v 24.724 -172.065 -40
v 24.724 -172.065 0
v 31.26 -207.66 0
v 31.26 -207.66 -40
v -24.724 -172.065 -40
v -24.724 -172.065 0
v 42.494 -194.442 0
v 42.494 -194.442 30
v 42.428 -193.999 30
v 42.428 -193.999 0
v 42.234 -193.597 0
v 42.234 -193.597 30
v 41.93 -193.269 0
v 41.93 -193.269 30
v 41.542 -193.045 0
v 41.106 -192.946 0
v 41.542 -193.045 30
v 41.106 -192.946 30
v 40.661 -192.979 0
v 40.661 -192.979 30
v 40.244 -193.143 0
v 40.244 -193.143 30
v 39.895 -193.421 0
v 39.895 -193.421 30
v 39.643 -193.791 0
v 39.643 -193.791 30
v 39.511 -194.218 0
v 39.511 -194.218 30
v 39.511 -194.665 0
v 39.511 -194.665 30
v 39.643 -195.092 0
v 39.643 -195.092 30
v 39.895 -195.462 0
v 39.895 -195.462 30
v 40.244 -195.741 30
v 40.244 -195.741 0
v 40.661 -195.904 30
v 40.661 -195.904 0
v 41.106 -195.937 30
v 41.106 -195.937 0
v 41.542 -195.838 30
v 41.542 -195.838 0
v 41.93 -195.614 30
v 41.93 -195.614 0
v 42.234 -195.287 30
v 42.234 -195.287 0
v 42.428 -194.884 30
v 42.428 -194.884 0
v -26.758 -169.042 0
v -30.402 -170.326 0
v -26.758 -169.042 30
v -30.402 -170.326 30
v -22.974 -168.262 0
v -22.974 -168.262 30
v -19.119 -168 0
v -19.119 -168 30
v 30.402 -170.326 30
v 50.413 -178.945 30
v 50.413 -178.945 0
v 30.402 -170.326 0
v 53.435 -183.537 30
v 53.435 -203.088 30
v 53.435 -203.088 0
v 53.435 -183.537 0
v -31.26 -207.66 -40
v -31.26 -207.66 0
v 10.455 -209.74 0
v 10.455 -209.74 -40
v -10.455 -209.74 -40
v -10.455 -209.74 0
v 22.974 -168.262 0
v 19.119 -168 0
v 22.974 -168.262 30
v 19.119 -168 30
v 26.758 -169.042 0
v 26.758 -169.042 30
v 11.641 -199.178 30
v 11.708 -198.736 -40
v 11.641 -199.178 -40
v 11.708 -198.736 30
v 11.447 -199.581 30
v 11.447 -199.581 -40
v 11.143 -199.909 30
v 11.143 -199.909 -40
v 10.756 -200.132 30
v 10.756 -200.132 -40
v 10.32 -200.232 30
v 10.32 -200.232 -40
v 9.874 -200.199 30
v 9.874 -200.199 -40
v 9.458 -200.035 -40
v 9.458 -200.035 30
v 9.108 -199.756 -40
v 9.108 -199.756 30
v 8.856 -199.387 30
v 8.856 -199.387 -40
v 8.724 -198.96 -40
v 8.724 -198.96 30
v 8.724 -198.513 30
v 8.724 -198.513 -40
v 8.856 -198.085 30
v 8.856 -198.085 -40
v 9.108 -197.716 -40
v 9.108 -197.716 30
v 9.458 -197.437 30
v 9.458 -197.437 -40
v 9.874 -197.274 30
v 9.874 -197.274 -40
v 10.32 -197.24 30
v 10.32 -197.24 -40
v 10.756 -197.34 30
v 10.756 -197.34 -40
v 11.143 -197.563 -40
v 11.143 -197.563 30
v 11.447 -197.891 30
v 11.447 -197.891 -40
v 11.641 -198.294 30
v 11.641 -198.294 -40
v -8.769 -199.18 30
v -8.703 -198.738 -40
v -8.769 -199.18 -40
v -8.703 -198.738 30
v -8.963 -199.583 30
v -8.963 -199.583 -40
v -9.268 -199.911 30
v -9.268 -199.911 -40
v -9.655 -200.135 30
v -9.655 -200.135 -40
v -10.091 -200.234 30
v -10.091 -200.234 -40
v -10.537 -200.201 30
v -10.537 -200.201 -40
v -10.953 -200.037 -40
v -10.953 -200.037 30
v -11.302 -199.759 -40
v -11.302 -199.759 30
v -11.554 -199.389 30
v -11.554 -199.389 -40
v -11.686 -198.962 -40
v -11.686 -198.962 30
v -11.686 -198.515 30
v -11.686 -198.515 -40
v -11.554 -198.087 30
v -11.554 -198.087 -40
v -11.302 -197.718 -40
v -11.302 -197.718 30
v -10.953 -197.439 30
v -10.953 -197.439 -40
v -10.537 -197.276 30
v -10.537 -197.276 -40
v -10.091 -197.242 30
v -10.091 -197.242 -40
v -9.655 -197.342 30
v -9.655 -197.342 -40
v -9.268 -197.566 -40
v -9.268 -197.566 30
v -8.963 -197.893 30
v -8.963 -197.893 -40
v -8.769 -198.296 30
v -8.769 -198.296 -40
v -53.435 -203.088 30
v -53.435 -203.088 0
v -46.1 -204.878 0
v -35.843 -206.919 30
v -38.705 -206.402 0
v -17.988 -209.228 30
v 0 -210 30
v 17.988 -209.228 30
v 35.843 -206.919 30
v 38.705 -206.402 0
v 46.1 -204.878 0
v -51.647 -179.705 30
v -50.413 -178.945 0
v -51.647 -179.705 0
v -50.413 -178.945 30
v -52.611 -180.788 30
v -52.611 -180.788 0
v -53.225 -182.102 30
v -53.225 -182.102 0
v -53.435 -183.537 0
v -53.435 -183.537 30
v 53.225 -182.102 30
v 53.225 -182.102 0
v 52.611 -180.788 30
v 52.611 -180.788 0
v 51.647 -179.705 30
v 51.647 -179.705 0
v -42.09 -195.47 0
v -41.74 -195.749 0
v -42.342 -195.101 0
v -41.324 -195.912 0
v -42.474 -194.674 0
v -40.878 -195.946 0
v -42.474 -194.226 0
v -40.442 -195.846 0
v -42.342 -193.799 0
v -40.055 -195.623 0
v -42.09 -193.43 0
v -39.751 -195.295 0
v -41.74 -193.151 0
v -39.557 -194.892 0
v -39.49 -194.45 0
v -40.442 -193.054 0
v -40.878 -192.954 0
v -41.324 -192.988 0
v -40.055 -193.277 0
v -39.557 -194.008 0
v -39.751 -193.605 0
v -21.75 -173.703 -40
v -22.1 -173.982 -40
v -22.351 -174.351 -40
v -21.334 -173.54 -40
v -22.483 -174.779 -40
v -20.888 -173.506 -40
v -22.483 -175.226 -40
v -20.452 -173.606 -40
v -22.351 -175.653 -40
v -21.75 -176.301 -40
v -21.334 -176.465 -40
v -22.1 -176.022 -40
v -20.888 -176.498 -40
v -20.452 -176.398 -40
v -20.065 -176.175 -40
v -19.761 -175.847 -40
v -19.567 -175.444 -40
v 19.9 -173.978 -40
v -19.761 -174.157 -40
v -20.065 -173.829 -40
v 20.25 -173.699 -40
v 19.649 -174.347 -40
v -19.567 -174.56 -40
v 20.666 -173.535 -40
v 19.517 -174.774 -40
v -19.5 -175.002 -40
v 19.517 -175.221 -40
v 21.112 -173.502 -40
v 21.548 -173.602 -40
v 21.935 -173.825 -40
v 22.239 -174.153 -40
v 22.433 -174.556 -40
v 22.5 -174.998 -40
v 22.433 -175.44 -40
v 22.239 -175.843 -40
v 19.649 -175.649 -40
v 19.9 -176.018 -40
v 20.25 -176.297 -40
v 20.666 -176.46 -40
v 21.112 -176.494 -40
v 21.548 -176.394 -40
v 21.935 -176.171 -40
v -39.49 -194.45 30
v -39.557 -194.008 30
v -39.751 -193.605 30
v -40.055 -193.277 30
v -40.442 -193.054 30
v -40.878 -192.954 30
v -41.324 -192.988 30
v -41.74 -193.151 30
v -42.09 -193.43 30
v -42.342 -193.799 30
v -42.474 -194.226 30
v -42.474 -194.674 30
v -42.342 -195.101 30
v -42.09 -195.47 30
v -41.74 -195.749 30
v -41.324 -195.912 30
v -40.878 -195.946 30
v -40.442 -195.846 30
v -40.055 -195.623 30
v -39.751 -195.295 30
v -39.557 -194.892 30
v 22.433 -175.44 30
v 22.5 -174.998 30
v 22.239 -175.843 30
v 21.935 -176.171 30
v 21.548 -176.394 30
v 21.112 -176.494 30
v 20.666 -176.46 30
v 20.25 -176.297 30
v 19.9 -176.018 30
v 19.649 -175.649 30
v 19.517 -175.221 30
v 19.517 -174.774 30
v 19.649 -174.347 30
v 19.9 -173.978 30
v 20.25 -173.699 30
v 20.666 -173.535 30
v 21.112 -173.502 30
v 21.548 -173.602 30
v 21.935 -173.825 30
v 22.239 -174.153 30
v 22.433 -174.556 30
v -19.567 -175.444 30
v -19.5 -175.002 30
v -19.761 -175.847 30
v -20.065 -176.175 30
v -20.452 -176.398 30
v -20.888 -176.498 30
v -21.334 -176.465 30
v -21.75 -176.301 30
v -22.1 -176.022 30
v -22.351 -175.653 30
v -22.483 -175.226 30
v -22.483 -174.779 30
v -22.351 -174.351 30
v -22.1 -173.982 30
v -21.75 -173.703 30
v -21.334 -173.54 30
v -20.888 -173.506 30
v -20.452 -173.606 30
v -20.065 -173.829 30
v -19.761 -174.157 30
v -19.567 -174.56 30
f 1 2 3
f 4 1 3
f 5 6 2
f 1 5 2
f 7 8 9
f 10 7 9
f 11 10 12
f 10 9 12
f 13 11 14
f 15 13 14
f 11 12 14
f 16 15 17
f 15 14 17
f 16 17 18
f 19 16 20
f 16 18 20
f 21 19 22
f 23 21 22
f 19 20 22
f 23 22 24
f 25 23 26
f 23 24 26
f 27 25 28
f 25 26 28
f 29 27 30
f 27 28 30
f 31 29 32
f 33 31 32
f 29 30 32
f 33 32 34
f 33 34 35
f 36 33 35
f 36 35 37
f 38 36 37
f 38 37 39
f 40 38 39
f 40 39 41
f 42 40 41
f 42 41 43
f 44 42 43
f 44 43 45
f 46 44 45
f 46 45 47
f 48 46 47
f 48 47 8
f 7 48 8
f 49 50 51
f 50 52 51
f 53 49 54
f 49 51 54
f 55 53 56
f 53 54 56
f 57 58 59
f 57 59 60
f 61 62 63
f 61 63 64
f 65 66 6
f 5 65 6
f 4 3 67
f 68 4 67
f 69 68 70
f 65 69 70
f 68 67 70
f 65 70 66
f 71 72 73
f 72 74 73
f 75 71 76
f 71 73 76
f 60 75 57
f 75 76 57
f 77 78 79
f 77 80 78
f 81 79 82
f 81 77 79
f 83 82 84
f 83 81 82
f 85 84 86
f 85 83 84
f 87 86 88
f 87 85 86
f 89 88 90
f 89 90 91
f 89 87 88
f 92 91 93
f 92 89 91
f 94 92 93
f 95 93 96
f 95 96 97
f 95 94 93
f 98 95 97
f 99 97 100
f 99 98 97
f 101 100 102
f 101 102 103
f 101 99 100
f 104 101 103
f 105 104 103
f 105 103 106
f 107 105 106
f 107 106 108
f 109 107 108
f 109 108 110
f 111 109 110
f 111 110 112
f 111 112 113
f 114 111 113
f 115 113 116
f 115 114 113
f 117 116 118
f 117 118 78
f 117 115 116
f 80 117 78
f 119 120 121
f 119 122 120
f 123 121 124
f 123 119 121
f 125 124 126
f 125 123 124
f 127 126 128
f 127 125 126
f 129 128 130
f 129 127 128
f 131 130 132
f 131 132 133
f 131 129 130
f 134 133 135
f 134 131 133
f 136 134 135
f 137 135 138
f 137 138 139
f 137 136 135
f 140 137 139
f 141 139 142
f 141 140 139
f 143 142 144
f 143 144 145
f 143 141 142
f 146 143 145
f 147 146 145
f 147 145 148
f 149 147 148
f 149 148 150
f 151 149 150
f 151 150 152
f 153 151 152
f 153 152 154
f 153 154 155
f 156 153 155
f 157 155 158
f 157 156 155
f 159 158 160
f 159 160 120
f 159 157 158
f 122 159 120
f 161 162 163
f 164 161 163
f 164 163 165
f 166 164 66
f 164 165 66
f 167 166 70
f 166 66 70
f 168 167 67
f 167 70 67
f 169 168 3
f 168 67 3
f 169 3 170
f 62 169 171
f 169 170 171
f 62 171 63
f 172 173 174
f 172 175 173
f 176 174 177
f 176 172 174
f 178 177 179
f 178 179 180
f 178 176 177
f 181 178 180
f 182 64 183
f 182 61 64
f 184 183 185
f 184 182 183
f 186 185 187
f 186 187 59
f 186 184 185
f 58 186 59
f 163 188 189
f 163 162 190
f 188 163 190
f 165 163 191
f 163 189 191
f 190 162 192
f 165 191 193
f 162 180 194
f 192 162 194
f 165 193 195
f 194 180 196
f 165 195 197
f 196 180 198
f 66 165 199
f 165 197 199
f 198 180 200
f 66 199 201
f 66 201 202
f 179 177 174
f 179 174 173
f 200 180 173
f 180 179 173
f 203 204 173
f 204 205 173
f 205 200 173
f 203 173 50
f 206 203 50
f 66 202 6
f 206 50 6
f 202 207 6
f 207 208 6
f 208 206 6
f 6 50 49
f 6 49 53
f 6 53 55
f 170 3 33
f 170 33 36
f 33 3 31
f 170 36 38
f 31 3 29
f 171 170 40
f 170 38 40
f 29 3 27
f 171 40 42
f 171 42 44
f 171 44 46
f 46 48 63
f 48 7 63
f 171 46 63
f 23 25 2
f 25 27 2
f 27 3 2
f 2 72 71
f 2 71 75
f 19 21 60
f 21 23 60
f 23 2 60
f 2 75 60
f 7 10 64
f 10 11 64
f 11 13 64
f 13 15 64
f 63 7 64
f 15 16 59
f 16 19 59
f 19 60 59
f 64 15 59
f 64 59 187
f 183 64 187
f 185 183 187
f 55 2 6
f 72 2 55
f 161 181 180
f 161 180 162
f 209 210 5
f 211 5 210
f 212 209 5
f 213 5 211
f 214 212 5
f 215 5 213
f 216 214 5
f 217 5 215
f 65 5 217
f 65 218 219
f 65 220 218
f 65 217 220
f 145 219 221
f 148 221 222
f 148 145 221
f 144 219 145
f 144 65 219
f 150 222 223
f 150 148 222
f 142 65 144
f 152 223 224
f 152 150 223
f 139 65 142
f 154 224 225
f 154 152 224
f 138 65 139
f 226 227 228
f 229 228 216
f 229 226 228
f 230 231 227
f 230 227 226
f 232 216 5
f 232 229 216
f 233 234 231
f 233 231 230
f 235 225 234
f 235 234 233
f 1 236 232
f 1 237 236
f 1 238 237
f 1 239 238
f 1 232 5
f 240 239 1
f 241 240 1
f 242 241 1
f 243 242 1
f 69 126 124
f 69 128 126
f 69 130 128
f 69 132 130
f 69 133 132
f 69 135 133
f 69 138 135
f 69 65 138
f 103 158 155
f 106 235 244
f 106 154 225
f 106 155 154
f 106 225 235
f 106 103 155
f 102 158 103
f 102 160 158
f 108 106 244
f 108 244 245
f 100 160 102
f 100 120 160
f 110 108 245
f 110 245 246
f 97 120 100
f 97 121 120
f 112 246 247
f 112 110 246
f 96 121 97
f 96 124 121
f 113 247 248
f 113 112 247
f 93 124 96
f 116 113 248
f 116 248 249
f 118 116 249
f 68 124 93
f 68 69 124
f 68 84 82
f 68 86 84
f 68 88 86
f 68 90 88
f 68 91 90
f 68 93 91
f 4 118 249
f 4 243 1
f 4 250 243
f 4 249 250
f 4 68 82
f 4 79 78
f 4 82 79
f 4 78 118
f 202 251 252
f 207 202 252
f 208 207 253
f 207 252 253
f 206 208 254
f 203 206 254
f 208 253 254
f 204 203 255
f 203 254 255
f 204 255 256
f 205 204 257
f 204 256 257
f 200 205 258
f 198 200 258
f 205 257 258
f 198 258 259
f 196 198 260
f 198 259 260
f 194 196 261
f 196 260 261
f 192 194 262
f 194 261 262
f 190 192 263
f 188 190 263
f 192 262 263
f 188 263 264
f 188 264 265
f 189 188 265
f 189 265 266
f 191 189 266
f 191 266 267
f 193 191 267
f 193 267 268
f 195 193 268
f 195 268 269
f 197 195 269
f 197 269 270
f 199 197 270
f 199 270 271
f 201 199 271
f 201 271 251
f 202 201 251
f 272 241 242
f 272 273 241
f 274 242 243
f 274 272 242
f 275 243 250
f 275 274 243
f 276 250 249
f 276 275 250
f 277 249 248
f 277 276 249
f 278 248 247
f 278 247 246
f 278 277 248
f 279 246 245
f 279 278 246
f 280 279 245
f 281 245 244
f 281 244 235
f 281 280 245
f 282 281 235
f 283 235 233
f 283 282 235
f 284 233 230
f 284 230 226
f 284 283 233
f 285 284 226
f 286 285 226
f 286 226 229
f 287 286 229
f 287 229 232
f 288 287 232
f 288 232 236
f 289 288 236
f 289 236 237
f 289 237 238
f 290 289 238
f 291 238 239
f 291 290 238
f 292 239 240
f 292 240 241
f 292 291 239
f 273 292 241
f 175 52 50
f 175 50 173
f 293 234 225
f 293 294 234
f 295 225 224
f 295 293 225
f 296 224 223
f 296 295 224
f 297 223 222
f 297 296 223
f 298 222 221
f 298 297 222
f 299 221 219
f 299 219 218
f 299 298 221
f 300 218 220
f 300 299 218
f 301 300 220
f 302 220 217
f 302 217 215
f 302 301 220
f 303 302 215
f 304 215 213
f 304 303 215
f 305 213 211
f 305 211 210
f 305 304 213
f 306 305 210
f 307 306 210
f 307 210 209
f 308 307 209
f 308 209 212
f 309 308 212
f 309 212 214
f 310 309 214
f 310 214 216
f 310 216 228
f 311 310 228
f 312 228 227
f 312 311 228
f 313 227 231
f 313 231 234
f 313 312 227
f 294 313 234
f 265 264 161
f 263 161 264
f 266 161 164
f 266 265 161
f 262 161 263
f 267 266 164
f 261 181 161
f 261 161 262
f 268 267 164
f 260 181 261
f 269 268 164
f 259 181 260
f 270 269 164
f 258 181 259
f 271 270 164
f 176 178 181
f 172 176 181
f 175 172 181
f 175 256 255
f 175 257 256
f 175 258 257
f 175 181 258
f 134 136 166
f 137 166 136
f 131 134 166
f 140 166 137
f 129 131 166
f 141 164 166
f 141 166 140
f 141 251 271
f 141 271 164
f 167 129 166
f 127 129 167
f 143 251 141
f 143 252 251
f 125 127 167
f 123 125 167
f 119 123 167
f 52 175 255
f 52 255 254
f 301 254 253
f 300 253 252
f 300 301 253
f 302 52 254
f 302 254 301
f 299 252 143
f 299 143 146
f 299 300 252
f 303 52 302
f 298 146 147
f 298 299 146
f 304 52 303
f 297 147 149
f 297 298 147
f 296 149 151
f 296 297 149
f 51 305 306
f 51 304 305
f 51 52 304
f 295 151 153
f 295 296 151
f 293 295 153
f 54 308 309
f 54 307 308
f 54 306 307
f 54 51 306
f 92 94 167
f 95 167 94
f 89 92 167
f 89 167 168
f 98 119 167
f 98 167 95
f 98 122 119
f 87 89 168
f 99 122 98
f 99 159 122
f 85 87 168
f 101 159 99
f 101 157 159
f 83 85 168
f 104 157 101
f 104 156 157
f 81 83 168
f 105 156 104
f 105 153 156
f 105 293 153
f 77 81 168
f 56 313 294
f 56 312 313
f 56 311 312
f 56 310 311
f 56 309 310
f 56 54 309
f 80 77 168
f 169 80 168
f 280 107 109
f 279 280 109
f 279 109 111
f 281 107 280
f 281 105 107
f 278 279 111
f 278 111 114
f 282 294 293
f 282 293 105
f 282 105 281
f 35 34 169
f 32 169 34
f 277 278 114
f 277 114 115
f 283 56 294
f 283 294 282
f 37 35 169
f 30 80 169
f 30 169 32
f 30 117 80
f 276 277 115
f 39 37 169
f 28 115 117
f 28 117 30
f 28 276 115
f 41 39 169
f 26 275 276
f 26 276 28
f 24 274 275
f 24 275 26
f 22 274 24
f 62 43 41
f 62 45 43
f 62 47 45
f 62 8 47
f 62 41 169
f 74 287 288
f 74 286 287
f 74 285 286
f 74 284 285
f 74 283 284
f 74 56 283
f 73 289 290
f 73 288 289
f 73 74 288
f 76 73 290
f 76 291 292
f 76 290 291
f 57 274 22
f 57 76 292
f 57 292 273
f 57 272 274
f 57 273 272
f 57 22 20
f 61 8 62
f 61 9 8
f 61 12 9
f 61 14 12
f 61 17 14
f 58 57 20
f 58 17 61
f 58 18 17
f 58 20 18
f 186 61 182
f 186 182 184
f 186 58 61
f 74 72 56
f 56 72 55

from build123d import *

# Parameters (mm, degrees)
F1_DEPTH = 30
F2_R     = 1.5
F3_DEPTH = 30.001
F4_R     = 28.5239911769
F5_R     = 5
F7_R     = 1.5
F8_DEPTH = 40


with BuildPart() as f1:
    # F0 (on Top) → F1 (new body)
    with BuildSketch(Plane.XY):
        with BuildLine():
            Line((-53.4347956585, -180.2462832153), (-53.4347956585, -203.0879676715))
            ThreePointArc((-53.4347956585, -203.0879676715), (0, -210), (53.4347956585, -203.0879676715))
            Line((53.4347956585, -203.0879676715), (53.4347956585, -180.2462832153))
            Line((53.4347956585, -180.2462832153), (25, -168))
            Line((25, -168), (0, -168))
            Line((0, -168), (-25, -168))
            Line((-25, -168), (-53.4347956585, -180.2462832153))
        make_face()
    extrude(amount=F1_DEPTH)

    # F2 (on face) → F3 (cut, through all)
    with BuildSketch(Plane.XY.offset(30)):
        with Locations((-61.4929363222, -189.1117421473)):
            Circle(F2_R)
        with Locations((-116.9707156809, -160.8515617902)):
            Circle(F2_R)
        with Locations((-161.0003432552, -116.8309564779)):
            Circle(F2_R)
        with Locations((-189.2718923255, -61.3589697679)):
            Circle(F2_R)
        with Locations((-199.0179466895, 0.1344137845)):
            Circle(F2_R)
        with Locations((61.4958267934, -189.0991398316)):
            Circle(F2_R)
        with Locations((116.9678135034, -160.8275907612)):
            Circle(F2_R)
        with Locations((160.9884188157, -116.7979631869)):
            Circle(F2_R)
        with Locations((189.2485991728, -61.3201838282)):
            Circle(F2_R)
        with Locations((198.9820512211, 0.175195735)):
            Circle(F2_R)
        with Locations((-20.9999999994, -175.0021517963)):
            Circle(F2_R)
        with Locations((-40.9903269079, -194.4499816389)):
            Circle(F2_R)
        with Locations((-10.2028351662, -198.7382755147)):
            Circle(F2_R)
        with Locations((20.9999997802, -174.9978481734)):
            Circle(F2_R)
        with Locations((10.2076995225, -198.7361841041)):
            Circle(F2_R)
        with Locations((40.9943117987, -194.4415809015)):
            Circle(F2_R)
    extrude(amount=-F3_DEPTH, mode=Mode.SUBTRACT)

    # F4
    f4_edges = [f1.edges().sort_by_distance(p)[0] for p in [
        (25, -168, 15),
        (-25, -168, 15),
    ]]
    fillet(f4_edges, radius=F4_R)

    # F5
    f5_edges = [f1.edges().sort_by_distance(p)[0] for p in [
        (53.434796, -180.246283, 15),
        (-53.434796, -180.246283, 15),
    ]]
    fillet(f5_edges, radius=F5_R)

    # F7 (on face) → F8 (join)
    with BuildSketch(Plane(origin=(0, 0, 0), x_dir=(1, 0, 0), z_dir=(0, 0, -1))):
        with BuildLine():
            ThreePointArc((31.2604393052, 207.6602632533), (0, 210), (-31.2604393052, 207.6602632533))
            Line((-31.2604393052, 207.6602632533), (-24.7243543685, 172.0646172762))
            Line((-24.7243543685, 172.0646172762), (0, 172.0646172762))
            Line((0, 172.0646172762), (24.7243543685, 172.0646172762))
            Line((24.7243543685, 172.0646172762), (31.2604393052, 207.6602632533))
        make_face()
        with Locations((-20.9999999994, 175.0021517963)):
            Circle(F7_R, mode=Mode.SUBTRACT)
        with Locations((20.9999997802, 174.9978481734)):
            Circle(F7_R, mode=Mode.SUBTRACT)
        with Locations((-10.2028351662, 198.7382755147)):
            Circle(F7_R, mode=Mode.SUBTRACT)
        with Locations((10.2076995225, 198.7361841041)):
            Circle(F7_R, mode=Mode.SUBTRACT)
    extrude(amount=F8_DEPTH)


solid = f1.part
